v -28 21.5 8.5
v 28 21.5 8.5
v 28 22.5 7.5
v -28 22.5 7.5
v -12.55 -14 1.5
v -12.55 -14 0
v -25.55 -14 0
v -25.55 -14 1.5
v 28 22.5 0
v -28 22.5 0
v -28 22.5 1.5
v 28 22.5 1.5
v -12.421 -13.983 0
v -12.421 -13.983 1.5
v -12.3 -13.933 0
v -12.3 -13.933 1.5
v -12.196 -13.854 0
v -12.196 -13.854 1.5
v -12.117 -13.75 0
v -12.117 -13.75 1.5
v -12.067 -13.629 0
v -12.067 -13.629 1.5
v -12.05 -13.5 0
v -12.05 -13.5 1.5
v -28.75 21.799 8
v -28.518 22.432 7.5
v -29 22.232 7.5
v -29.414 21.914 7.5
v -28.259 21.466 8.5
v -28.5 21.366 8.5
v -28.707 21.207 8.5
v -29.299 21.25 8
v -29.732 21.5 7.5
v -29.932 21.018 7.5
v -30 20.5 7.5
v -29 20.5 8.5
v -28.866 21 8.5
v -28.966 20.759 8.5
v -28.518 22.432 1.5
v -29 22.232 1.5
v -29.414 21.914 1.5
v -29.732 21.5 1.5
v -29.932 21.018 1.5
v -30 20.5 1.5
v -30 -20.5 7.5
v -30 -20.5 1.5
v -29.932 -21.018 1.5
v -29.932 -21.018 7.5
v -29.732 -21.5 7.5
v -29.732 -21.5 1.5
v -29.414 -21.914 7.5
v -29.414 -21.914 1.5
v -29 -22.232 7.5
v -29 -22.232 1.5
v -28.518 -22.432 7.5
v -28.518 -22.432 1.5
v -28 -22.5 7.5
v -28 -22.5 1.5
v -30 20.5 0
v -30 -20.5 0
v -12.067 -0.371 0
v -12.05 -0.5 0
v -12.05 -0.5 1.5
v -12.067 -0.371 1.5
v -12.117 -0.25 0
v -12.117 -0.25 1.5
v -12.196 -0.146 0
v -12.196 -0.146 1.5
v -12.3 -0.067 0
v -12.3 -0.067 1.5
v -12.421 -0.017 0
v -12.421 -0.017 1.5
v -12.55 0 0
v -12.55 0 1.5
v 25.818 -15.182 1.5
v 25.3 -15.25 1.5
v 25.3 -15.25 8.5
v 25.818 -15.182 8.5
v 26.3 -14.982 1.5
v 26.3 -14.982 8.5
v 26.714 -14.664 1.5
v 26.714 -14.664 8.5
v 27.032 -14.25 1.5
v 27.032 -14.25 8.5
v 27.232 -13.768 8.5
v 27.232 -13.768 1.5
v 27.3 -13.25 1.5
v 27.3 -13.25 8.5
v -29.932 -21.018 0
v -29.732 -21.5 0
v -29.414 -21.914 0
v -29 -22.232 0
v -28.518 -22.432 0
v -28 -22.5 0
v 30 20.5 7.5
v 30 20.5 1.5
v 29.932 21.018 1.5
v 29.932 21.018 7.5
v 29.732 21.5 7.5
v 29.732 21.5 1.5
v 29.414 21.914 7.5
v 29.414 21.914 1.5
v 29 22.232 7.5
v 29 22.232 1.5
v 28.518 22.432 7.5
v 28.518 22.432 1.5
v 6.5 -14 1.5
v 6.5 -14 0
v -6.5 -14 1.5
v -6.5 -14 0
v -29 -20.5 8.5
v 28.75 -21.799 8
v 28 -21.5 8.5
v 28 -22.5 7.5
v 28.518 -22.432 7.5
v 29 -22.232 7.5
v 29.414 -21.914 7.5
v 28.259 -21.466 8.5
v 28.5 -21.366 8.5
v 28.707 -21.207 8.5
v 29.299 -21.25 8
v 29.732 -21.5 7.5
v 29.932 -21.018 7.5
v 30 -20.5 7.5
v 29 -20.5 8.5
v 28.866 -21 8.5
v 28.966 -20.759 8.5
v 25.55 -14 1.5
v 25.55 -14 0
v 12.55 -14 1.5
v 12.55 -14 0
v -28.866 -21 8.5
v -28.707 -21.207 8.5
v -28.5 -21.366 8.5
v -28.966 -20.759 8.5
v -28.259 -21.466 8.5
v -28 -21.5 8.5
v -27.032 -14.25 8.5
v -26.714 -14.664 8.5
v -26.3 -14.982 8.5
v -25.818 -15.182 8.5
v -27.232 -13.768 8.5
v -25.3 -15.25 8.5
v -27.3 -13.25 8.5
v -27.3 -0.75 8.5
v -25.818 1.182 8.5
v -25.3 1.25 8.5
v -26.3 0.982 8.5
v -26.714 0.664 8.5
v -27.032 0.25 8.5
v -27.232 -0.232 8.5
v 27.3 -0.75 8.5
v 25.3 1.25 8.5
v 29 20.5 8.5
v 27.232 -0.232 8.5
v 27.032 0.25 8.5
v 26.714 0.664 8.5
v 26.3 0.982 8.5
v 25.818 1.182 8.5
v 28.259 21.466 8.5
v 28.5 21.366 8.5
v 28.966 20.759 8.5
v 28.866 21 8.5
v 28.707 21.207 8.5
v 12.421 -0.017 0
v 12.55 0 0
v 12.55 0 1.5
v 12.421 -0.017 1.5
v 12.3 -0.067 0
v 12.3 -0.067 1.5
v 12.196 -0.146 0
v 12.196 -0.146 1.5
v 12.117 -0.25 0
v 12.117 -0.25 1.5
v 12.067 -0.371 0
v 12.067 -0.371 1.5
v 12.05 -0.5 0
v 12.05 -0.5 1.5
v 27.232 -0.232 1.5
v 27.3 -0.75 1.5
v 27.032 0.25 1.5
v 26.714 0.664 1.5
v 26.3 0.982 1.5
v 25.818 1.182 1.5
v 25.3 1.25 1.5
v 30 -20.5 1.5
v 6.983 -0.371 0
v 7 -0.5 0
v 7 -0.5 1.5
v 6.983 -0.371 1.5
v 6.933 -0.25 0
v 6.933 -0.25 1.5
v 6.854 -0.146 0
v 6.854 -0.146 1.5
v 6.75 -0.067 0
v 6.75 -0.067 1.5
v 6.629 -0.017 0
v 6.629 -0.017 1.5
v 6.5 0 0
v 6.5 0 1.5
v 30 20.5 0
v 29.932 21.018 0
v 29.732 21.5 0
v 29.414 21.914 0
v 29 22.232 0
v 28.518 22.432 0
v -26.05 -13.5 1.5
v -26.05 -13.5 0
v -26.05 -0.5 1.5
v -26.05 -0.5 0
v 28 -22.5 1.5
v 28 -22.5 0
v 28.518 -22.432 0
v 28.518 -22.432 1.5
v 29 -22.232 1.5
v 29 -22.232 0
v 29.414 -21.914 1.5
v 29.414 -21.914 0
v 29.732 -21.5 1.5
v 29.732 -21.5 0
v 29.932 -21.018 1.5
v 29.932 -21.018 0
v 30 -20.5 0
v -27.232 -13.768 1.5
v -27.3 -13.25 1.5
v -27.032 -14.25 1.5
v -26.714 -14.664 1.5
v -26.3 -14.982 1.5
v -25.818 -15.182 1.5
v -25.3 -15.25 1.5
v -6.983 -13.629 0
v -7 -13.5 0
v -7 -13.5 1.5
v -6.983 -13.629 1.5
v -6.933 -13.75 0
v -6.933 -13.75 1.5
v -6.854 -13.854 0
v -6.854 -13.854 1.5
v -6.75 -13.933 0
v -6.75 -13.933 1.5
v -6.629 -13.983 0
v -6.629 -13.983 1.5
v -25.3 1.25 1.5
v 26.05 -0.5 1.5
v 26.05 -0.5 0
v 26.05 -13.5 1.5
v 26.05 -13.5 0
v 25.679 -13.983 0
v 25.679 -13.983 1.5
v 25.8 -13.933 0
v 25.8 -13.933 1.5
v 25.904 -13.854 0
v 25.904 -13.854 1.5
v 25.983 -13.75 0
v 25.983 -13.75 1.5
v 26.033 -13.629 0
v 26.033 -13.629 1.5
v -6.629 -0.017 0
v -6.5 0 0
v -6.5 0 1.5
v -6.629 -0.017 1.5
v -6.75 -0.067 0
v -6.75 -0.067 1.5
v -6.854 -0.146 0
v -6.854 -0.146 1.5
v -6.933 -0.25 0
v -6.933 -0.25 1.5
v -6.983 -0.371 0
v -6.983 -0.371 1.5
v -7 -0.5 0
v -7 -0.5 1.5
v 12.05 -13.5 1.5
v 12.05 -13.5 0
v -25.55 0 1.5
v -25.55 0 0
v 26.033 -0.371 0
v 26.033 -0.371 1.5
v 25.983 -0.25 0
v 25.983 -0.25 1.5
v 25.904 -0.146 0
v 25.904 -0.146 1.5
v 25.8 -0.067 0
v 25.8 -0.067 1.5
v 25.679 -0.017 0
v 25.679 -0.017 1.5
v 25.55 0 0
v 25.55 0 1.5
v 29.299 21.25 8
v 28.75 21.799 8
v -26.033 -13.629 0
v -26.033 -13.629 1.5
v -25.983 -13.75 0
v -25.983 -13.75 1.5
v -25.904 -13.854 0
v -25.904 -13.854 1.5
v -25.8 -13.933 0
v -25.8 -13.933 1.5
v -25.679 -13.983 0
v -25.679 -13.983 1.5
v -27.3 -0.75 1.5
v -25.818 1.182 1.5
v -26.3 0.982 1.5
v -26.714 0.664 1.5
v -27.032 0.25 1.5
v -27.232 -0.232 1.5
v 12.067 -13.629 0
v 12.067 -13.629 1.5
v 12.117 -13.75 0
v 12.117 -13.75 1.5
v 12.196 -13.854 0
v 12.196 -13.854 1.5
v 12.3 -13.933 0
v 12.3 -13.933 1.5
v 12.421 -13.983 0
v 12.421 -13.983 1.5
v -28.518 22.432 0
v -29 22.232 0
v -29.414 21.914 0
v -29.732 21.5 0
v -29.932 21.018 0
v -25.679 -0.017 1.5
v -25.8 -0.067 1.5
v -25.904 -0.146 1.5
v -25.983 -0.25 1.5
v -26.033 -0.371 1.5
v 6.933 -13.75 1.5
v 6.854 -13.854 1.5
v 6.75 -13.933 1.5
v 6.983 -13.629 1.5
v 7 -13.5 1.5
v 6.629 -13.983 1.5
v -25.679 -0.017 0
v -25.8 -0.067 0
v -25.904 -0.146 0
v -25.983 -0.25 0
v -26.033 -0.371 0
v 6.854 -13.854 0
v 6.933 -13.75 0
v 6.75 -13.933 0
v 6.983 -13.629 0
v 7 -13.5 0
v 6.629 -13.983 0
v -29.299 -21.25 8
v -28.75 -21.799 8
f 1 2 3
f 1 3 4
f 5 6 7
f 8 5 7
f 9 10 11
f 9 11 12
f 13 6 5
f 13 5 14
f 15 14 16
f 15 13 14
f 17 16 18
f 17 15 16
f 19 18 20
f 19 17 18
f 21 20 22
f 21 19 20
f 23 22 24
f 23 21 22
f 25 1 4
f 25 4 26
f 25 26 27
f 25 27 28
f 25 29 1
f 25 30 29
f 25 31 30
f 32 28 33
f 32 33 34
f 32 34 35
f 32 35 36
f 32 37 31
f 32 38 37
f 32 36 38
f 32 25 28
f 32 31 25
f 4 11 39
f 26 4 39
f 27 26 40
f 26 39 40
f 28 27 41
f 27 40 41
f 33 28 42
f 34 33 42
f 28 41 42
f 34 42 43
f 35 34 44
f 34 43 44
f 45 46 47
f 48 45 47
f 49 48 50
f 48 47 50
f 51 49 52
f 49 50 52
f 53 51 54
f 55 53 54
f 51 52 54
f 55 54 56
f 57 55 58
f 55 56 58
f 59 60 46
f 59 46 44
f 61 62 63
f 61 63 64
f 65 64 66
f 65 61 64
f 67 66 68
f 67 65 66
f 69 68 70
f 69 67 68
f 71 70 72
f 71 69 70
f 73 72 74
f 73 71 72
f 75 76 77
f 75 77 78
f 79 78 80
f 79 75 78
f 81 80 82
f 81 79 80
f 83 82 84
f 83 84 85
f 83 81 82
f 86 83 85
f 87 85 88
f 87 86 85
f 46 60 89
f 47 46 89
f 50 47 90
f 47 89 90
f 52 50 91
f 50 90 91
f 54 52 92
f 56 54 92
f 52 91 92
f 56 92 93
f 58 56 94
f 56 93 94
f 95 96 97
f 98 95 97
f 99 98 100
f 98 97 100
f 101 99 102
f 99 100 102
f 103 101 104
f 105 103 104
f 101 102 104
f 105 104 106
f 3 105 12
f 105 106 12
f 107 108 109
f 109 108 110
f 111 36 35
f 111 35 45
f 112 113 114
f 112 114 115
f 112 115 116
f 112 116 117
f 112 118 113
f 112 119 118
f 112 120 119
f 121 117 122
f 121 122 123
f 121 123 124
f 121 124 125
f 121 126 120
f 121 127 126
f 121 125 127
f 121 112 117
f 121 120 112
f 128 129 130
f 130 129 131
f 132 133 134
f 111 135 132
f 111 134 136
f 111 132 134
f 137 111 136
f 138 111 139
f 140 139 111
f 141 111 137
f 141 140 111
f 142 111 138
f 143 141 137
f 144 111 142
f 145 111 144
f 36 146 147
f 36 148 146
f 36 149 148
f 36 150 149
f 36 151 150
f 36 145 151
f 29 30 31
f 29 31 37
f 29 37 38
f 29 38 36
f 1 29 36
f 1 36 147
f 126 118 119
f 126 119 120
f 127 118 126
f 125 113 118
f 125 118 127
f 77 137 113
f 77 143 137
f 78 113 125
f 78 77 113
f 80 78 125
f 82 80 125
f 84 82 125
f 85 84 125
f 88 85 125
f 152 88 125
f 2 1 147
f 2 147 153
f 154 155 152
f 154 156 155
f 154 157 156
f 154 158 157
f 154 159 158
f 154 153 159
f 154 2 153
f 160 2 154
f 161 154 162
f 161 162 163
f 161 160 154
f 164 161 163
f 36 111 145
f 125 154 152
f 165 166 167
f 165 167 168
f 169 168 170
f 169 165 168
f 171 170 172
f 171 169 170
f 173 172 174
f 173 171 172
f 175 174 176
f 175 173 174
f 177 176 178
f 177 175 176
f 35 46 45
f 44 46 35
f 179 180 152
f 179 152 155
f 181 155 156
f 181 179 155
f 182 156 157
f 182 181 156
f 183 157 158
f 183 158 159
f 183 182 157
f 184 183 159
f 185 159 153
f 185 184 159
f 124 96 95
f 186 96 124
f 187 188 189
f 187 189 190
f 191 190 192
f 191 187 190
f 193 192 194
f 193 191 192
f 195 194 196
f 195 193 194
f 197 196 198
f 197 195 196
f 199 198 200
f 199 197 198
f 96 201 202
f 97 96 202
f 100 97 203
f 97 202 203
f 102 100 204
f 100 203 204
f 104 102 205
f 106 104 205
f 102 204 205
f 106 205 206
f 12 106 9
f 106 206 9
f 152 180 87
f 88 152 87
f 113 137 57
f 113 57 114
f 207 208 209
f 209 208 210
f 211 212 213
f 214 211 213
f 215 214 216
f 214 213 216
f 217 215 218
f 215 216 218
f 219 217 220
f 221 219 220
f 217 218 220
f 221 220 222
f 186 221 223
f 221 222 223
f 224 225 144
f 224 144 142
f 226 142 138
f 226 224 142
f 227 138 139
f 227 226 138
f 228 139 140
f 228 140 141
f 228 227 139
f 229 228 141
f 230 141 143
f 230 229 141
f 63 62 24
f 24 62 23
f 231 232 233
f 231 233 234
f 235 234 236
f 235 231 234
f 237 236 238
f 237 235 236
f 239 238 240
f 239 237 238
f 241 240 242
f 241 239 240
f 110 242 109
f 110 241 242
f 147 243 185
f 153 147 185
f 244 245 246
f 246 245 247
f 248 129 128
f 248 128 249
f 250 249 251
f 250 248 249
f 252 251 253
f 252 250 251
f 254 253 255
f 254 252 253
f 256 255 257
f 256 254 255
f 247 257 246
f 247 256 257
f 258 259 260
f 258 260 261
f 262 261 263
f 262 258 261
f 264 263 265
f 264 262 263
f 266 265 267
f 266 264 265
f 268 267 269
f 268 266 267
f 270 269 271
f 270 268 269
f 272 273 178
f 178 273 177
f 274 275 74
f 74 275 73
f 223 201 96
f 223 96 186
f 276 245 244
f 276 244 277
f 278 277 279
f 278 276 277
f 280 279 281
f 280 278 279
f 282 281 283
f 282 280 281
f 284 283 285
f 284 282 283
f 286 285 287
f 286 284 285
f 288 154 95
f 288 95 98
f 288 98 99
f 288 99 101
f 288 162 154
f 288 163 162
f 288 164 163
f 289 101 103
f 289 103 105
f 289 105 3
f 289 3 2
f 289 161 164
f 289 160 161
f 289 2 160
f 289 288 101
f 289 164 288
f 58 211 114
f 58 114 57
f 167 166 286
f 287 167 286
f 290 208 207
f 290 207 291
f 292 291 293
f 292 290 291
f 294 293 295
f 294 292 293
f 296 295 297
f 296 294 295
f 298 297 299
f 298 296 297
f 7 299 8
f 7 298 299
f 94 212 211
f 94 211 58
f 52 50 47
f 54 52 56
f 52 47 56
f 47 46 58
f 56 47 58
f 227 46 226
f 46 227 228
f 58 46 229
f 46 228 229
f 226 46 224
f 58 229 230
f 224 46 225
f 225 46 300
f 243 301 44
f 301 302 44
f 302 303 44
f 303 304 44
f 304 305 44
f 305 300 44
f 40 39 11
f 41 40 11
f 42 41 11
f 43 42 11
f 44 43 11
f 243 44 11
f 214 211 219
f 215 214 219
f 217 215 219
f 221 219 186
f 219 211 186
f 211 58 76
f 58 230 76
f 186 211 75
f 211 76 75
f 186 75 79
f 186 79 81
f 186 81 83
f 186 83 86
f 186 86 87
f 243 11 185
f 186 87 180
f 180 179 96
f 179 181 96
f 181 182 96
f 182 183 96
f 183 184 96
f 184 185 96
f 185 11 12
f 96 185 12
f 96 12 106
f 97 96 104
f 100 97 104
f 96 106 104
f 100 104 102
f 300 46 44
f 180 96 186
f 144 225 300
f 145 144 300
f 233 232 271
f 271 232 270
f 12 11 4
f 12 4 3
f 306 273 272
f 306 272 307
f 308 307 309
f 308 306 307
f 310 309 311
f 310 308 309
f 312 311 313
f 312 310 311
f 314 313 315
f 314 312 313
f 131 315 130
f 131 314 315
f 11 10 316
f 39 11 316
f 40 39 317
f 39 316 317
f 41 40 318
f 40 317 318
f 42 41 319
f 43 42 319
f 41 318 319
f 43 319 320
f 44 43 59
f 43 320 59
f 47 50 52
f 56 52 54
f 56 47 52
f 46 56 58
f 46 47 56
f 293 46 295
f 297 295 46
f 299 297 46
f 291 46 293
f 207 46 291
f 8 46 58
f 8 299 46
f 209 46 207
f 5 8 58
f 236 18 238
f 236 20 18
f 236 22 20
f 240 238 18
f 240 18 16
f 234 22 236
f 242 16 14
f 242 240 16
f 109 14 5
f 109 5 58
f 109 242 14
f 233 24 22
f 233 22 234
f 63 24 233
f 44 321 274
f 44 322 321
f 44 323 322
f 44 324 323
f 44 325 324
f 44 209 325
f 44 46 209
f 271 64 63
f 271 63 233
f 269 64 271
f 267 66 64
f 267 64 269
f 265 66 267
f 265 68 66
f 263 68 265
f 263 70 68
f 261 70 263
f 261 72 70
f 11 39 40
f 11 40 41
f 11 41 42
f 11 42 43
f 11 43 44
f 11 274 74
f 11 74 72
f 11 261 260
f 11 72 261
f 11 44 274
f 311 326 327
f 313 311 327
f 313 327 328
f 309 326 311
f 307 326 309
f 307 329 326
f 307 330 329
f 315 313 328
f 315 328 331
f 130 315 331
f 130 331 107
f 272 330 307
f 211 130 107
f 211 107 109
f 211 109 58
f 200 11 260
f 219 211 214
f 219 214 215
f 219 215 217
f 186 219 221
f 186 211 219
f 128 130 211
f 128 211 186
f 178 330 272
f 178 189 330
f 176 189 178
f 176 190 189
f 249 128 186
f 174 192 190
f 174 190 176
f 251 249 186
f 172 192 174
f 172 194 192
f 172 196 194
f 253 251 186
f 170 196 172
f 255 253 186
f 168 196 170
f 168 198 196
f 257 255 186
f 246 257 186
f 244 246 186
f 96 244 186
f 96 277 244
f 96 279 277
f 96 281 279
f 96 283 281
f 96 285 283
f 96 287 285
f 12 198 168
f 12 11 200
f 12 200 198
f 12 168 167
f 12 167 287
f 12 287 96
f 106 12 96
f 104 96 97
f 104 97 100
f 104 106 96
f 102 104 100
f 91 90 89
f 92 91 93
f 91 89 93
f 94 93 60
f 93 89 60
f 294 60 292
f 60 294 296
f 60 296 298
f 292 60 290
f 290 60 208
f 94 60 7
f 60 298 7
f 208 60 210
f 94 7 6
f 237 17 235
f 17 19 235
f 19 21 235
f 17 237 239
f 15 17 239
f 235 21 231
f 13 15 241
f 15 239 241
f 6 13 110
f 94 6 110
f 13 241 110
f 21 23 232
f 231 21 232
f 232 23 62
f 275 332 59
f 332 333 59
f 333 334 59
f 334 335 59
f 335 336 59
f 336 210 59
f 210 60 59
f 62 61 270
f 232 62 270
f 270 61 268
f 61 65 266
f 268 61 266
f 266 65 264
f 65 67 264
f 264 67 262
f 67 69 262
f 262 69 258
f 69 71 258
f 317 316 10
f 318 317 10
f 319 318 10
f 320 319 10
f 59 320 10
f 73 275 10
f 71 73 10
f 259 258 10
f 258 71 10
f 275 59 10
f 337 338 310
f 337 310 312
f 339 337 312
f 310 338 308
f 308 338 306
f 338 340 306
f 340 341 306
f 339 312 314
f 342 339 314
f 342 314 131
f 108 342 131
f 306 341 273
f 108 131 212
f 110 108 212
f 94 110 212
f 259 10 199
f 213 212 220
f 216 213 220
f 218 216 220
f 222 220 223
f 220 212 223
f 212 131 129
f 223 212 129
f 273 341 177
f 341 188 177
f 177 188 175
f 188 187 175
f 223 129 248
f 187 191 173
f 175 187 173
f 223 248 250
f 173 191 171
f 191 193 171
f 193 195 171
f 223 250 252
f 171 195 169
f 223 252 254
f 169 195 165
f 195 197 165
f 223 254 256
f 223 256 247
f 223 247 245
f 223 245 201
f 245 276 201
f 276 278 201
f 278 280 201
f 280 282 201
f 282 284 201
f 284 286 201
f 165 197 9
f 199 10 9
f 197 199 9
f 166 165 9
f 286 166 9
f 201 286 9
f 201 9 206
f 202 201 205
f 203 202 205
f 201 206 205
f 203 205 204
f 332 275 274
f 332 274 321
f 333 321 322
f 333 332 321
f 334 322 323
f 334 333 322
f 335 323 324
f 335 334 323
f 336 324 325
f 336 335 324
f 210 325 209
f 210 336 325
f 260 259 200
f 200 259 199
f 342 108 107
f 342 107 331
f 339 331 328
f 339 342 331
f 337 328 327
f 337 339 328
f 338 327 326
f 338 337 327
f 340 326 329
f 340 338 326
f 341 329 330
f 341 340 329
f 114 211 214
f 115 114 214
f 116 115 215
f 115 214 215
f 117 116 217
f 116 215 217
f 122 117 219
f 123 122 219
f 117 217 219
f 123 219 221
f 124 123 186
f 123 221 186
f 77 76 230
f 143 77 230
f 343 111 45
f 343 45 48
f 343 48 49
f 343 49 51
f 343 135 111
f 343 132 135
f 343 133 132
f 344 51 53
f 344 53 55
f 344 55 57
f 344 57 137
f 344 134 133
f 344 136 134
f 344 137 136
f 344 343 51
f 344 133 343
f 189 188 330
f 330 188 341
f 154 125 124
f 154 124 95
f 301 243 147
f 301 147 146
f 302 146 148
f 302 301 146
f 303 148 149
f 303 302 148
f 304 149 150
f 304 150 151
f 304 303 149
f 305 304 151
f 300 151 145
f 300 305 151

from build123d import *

# Parameters (mm, degrees)
EXTRUDE_DEPTH    = 1.5
EXTRUDE001_DEPTH = 7
CHAMFER_SIZE     = 1


with BuildPart() as top_plate:
    # Sketch → Extrude (new body)
    with BuildSketch(Plane.XY):
        with BuildLine():
            ThreePointArc((-28, 22.5), (-29.414214, 21.914214), (-30, 20.5))
            Line((-30, -20.5), (-30, 20.5))
            ThreePointArc((-30, -20.5), (-29.414214, -21.914214), (-28, -22.5))
            Line((28, -22.5), (-28, -22.5))
            ThreePointArc((28, -22.5), (29.414214, -21.914214), (30, -20.5))
            Line((30, 20.5), (30, -20.5))
            ThreePointArc((30, 20.5), (29.414214, 21.914214), (28, 22.5))
            Line((-28, 22.5), (28, 22.5))
        make_face()
        with BuildLine():
            ThreePointArc((-6.5, 0), (-6.853553, -0.146447), (-7, -0.5))
            Line((-7, -13.5), (-7, -0.5))
            ThreePointArc((-7, -13.5), (-6.853553, -13.853553), (-6.5, -14))
            Line((6.5, -14), (-6.5, -14))
            ThreePointArc((6.5, -14), (6.853553, -13.853553), (7, -13.5))
            Line((7, -0.5), (7, -13.5))
            ThreePointArc((7, -0.5), (6.853553, -0.146447), (6.5, 0))
            Line((-6.5, 0), (6.5, 0))
        make_face(mode=Mode.SUBTRACT)
        with BuildLine():
            ThreePointArc((-25.55, 0), (-25.903553, -0.146447), (-26.05, -0.5))
            Line((-26.05, -13.5), (-26.05, -0.5))
            ThreePointArc((-26.05, -13.5), (-25.903553, -13.853553), (-25.55, -14))
            Line((-12.55, -14), (-25.55, -14))
            ThreePointArc((-12.55, -14), (-12.196447, -13.853553), (-12.05, -13.5))
            Line((-12.05, -0.5), (-12.05, -13.5))
            ThreePointArc((-12.05, -0.5), (-12.196447, -0.146447), (-12.55, 0))
            Line((-25.55, 0), (-12.55, 0))
        make_face(mode=Mode.SUBTRACT)
        with BuildLine():
            ThreePointArc((12.55, 0), (12.196447, -0.146447), (12.05, -0.5))
            Line((12.05, -13.5), (12.05, -0.5))
            ThreePointArc((12.05, -13.5), (12.196447, -13.853553), (12.55, -14))
            Line((25.55, -14), (12.55, -14))
            ThreePointArc((25.55, -14), (25.903553, -13.853553), (26.05, -13.5))
            Line((26.05, -0.5), (26.05, -13.5))
            ThreePointArc((26.05, -0.5), (25.903553, -0.146447), (25.55, 0))
            Line((12.55, 0), (25.55, 0))
        make_face(mode=Mode.SUBTRACT)
    extrude(amount=EXTRUDE_DEPTH)


with BuildPart() as top_shroud_chamfered:
    # Sketch001 (on Face34 of Extrude) → Extrude001 (new body)
    with BuildSketch(Plane.XY.offset(1.5)):
        with BuildLine():
            ThreePointArc((-28, 22.5), (-29.414214, 21.914214), (-30, 20.5))
            Line((-30, -20.5), (-30, 20.5))
            ThreePointArc((-30, -20.5), (-29.414214, -21.914214), (-28, -22.5))
            Line((28, -22.5), (-28, -22.5))
            ThreePointArc((28, -22.5), (29.414214, -21.914214), (30, -20.5))
            Line((30, 20.5), (30, -20.5))
            ThreePointArc((30, 20.5), (29.414214, 21.914214), (28, 22.5))
            Line((-28, 22.5), (28, 22.5))
        make_face()
        with BuildLine():
            ThreePointArc((-25.3, 1.25), (-26.714214, 0.664214), (-27.3, -0.75))
            Line((-27.3, -13.25), (-27.3, -0.75))
            ThreePointArc((-27.3, -13.25), (-26.714214, -14.664214), (-25.3, -15.25))
            Line((25.3, -15.25), (-25.3, -15.25))
            ThreePointArc((25.3, -15.25), (26.714214, -14.664214), (27.3, -13.25))
            Line((27.3, -0.75), (27.3, -13.25))
            ThreePointArc((27.3, -0.75), (26.714214, 0.664214), (25.3, 1.25))
            Line((-25.3, 1.25), (25.3, 1.25))
        make_face(mode=Mode.SUBTRACT)
    extrude(amount=EXTRUDE001_DEPTH)

    # Chamfer
    chamfer_edges = [top_shroud_chamfered.edges().sort_by_distance(p)[0] for p in [
        (-29.414214, 21.914214, 8.5),
        (-30, 0, 8.5),
        (-29.414214, -21.914214, 8.5),
        (0, -22.5, 8.5),
        (29.414214, -21.914214, 8.5),
        (30, 0, 8.5),
        (29.414214, 21.914214, 8.5),
        (0, 22.5, 8.5),
    ]]
    chamfer(chamfer_edges, length=CHAMFER_SIZE)


solid = Compound([top_plate.part, top_shroud_chamfered.part])
